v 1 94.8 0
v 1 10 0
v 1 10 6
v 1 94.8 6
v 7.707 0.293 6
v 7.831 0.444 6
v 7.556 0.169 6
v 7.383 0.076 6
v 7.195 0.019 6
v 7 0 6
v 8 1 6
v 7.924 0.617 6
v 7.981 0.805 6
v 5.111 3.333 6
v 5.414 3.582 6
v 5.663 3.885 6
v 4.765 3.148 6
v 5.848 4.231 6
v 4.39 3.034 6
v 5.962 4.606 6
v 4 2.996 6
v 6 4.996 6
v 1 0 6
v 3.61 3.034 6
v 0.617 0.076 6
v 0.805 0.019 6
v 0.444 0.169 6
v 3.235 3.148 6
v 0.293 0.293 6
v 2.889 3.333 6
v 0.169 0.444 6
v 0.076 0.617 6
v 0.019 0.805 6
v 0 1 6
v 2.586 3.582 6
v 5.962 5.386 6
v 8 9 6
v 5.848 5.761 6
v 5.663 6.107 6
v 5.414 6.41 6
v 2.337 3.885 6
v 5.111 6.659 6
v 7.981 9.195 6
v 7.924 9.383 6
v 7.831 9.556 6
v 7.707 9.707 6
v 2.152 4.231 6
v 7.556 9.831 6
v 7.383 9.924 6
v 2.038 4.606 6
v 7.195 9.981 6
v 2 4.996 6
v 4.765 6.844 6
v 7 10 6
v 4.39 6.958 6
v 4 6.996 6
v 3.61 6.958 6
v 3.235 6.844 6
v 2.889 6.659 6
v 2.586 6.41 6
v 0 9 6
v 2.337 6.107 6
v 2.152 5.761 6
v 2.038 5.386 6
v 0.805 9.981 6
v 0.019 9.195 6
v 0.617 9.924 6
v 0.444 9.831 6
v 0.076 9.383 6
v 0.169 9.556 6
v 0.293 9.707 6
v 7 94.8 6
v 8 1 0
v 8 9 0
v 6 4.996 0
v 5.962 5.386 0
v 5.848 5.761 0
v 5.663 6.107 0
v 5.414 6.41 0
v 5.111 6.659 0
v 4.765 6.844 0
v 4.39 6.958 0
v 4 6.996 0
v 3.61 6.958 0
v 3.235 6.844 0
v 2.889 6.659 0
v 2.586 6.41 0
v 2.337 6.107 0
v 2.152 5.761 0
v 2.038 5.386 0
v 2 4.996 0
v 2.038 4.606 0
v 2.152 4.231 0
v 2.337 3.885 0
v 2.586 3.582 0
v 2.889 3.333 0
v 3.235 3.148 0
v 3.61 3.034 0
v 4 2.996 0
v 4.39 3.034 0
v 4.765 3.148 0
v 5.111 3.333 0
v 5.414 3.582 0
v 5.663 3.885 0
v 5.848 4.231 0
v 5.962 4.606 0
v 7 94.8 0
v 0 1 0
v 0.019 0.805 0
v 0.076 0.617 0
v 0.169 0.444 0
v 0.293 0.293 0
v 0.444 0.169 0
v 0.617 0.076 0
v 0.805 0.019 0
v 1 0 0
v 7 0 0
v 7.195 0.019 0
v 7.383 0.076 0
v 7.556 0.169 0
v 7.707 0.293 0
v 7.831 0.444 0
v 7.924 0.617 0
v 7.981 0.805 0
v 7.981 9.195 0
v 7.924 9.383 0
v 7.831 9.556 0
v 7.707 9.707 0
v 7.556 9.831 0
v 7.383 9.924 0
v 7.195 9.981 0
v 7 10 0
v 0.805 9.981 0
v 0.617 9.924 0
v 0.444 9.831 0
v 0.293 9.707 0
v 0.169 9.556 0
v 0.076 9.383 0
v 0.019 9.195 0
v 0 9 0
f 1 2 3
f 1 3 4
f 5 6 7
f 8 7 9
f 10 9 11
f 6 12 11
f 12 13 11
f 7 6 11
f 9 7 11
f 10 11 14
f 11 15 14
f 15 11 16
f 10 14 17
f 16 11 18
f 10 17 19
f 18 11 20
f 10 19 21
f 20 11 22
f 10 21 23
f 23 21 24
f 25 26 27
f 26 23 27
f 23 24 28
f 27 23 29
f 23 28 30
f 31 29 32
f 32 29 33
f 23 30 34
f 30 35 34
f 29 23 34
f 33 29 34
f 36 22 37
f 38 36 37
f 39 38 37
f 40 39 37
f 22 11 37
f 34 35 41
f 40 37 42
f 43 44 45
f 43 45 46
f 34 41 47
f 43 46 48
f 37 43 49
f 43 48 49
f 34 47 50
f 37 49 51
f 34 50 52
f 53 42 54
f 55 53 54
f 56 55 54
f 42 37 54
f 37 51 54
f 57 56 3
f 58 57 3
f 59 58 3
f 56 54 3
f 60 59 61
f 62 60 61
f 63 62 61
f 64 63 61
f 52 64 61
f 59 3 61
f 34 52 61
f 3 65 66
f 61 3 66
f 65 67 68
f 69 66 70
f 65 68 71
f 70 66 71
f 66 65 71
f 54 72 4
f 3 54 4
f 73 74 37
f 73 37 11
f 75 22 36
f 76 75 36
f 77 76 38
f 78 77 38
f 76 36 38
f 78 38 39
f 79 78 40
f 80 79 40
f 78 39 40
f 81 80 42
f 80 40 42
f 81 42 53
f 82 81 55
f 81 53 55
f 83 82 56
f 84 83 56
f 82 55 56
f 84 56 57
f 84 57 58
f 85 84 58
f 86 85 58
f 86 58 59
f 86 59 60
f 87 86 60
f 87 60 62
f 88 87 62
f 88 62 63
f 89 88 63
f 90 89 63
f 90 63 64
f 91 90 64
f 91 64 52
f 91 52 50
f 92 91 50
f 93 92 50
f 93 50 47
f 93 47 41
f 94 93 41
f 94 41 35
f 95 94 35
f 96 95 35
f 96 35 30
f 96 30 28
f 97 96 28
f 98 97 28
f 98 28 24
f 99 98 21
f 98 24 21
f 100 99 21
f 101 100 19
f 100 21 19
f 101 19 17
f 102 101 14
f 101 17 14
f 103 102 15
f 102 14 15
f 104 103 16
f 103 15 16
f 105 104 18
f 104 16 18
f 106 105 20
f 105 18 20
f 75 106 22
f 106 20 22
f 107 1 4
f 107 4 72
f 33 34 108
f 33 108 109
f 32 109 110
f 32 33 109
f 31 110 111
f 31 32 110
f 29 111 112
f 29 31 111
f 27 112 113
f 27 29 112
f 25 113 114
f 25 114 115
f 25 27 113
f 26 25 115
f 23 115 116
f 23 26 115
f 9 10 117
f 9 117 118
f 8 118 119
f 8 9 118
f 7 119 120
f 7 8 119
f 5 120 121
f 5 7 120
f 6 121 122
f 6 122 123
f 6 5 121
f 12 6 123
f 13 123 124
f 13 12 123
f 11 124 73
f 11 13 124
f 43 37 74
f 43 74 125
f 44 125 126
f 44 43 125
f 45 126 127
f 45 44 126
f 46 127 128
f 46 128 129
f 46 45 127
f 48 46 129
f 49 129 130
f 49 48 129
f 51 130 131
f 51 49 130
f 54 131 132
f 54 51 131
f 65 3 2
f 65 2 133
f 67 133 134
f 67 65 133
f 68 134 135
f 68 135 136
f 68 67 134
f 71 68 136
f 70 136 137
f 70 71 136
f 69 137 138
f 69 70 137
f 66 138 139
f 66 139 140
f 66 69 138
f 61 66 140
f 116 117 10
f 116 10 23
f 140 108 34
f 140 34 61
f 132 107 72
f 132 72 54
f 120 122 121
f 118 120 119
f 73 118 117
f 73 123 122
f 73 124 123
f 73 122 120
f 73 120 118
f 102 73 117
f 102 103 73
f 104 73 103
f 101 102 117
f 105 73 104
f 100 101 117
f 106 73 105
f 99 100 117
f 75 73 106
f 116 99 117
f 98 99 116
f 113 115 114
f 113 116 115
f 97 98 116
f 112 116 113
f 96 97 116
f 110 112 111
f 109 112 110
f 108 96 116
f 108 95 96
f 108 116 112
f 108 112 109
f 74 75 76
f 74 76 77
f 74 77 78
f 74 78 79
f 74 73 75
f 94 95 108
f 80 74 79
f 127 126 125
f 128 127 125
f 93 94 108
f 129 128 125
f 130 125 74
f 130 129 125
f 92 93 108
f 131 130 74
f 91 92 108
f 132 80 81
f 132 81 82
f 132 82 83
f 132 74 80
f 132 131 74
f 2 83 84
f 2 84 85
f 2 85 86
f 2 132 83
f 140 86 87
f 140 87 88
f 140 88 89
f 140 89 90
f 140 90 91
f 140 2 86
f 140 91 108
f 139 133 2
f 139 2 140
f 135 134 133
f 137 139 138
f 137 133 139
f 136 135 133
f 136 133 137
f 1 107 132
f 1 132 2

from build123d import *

# Parameters (mm, degrees)
PAD_DEPTH       = 6
SKETCH001_R     = 2
POCKET_DEPTH    = 8
POCKET001_DEPTH = 7


with BuildPart() as part:
    # Sketch → Pad (new body)
    with BuildSketch(Plane.XY):
        Polygon((1, 94.8), (7, 94.8), (7, 10), (8, 10), (8, 0), (0, 0), (0, 10), (1, 10), align=None)
    extrude(amount=PAD_DEPTH)

    # Sketch001 (on Face10 of Pad) → Pocket (cut)
    with BuildSketch(Plane.XY.offset(6)):
        with Locations((4, 4.995998)):
            Circle(SKETCH001_R)
    extrude(amount=-POCKET_DEPTH, mode=Mode.SUBTRACT)

    # Sketch002 (on Face5 of Pocket) → Pocket001 (cut)
    with BuildSketch(Plane.XY.offset(6)):
        with BuildLine():
            ThreePointArc((0, 1), (0.292893, 0.292893), (1, 0))
            Line((0, 0), (1, 0))
            Line((0, 1), (0, 0))
        make_face()
        with BuildLine():
            ThreePointArc((1, 10), (0.292893, 9.707107), (0, 9))
            Line((0, 9), (0, 10))
            Line((0, 10), (1, 10))
        make_face()
        with BuildLine():
            ThreePointArc((8, 9), (7.707107, 9.707107), (7, 10))
            Line((7, 10), (8, 10))
            Line((8, 10), (8, 9))
        make_face()
        with BuildLine():
            ThreePointArc((7, 0), (7.707107, 0.292893), (8, 1))
            Line((8, 0), (8, 1))
            Line((7, 0), (8, 0))
        make_face()
    extrude(amount=-POCKET001_DEPTH, mode=Mode.SUBTRACT)


solid = part.part
